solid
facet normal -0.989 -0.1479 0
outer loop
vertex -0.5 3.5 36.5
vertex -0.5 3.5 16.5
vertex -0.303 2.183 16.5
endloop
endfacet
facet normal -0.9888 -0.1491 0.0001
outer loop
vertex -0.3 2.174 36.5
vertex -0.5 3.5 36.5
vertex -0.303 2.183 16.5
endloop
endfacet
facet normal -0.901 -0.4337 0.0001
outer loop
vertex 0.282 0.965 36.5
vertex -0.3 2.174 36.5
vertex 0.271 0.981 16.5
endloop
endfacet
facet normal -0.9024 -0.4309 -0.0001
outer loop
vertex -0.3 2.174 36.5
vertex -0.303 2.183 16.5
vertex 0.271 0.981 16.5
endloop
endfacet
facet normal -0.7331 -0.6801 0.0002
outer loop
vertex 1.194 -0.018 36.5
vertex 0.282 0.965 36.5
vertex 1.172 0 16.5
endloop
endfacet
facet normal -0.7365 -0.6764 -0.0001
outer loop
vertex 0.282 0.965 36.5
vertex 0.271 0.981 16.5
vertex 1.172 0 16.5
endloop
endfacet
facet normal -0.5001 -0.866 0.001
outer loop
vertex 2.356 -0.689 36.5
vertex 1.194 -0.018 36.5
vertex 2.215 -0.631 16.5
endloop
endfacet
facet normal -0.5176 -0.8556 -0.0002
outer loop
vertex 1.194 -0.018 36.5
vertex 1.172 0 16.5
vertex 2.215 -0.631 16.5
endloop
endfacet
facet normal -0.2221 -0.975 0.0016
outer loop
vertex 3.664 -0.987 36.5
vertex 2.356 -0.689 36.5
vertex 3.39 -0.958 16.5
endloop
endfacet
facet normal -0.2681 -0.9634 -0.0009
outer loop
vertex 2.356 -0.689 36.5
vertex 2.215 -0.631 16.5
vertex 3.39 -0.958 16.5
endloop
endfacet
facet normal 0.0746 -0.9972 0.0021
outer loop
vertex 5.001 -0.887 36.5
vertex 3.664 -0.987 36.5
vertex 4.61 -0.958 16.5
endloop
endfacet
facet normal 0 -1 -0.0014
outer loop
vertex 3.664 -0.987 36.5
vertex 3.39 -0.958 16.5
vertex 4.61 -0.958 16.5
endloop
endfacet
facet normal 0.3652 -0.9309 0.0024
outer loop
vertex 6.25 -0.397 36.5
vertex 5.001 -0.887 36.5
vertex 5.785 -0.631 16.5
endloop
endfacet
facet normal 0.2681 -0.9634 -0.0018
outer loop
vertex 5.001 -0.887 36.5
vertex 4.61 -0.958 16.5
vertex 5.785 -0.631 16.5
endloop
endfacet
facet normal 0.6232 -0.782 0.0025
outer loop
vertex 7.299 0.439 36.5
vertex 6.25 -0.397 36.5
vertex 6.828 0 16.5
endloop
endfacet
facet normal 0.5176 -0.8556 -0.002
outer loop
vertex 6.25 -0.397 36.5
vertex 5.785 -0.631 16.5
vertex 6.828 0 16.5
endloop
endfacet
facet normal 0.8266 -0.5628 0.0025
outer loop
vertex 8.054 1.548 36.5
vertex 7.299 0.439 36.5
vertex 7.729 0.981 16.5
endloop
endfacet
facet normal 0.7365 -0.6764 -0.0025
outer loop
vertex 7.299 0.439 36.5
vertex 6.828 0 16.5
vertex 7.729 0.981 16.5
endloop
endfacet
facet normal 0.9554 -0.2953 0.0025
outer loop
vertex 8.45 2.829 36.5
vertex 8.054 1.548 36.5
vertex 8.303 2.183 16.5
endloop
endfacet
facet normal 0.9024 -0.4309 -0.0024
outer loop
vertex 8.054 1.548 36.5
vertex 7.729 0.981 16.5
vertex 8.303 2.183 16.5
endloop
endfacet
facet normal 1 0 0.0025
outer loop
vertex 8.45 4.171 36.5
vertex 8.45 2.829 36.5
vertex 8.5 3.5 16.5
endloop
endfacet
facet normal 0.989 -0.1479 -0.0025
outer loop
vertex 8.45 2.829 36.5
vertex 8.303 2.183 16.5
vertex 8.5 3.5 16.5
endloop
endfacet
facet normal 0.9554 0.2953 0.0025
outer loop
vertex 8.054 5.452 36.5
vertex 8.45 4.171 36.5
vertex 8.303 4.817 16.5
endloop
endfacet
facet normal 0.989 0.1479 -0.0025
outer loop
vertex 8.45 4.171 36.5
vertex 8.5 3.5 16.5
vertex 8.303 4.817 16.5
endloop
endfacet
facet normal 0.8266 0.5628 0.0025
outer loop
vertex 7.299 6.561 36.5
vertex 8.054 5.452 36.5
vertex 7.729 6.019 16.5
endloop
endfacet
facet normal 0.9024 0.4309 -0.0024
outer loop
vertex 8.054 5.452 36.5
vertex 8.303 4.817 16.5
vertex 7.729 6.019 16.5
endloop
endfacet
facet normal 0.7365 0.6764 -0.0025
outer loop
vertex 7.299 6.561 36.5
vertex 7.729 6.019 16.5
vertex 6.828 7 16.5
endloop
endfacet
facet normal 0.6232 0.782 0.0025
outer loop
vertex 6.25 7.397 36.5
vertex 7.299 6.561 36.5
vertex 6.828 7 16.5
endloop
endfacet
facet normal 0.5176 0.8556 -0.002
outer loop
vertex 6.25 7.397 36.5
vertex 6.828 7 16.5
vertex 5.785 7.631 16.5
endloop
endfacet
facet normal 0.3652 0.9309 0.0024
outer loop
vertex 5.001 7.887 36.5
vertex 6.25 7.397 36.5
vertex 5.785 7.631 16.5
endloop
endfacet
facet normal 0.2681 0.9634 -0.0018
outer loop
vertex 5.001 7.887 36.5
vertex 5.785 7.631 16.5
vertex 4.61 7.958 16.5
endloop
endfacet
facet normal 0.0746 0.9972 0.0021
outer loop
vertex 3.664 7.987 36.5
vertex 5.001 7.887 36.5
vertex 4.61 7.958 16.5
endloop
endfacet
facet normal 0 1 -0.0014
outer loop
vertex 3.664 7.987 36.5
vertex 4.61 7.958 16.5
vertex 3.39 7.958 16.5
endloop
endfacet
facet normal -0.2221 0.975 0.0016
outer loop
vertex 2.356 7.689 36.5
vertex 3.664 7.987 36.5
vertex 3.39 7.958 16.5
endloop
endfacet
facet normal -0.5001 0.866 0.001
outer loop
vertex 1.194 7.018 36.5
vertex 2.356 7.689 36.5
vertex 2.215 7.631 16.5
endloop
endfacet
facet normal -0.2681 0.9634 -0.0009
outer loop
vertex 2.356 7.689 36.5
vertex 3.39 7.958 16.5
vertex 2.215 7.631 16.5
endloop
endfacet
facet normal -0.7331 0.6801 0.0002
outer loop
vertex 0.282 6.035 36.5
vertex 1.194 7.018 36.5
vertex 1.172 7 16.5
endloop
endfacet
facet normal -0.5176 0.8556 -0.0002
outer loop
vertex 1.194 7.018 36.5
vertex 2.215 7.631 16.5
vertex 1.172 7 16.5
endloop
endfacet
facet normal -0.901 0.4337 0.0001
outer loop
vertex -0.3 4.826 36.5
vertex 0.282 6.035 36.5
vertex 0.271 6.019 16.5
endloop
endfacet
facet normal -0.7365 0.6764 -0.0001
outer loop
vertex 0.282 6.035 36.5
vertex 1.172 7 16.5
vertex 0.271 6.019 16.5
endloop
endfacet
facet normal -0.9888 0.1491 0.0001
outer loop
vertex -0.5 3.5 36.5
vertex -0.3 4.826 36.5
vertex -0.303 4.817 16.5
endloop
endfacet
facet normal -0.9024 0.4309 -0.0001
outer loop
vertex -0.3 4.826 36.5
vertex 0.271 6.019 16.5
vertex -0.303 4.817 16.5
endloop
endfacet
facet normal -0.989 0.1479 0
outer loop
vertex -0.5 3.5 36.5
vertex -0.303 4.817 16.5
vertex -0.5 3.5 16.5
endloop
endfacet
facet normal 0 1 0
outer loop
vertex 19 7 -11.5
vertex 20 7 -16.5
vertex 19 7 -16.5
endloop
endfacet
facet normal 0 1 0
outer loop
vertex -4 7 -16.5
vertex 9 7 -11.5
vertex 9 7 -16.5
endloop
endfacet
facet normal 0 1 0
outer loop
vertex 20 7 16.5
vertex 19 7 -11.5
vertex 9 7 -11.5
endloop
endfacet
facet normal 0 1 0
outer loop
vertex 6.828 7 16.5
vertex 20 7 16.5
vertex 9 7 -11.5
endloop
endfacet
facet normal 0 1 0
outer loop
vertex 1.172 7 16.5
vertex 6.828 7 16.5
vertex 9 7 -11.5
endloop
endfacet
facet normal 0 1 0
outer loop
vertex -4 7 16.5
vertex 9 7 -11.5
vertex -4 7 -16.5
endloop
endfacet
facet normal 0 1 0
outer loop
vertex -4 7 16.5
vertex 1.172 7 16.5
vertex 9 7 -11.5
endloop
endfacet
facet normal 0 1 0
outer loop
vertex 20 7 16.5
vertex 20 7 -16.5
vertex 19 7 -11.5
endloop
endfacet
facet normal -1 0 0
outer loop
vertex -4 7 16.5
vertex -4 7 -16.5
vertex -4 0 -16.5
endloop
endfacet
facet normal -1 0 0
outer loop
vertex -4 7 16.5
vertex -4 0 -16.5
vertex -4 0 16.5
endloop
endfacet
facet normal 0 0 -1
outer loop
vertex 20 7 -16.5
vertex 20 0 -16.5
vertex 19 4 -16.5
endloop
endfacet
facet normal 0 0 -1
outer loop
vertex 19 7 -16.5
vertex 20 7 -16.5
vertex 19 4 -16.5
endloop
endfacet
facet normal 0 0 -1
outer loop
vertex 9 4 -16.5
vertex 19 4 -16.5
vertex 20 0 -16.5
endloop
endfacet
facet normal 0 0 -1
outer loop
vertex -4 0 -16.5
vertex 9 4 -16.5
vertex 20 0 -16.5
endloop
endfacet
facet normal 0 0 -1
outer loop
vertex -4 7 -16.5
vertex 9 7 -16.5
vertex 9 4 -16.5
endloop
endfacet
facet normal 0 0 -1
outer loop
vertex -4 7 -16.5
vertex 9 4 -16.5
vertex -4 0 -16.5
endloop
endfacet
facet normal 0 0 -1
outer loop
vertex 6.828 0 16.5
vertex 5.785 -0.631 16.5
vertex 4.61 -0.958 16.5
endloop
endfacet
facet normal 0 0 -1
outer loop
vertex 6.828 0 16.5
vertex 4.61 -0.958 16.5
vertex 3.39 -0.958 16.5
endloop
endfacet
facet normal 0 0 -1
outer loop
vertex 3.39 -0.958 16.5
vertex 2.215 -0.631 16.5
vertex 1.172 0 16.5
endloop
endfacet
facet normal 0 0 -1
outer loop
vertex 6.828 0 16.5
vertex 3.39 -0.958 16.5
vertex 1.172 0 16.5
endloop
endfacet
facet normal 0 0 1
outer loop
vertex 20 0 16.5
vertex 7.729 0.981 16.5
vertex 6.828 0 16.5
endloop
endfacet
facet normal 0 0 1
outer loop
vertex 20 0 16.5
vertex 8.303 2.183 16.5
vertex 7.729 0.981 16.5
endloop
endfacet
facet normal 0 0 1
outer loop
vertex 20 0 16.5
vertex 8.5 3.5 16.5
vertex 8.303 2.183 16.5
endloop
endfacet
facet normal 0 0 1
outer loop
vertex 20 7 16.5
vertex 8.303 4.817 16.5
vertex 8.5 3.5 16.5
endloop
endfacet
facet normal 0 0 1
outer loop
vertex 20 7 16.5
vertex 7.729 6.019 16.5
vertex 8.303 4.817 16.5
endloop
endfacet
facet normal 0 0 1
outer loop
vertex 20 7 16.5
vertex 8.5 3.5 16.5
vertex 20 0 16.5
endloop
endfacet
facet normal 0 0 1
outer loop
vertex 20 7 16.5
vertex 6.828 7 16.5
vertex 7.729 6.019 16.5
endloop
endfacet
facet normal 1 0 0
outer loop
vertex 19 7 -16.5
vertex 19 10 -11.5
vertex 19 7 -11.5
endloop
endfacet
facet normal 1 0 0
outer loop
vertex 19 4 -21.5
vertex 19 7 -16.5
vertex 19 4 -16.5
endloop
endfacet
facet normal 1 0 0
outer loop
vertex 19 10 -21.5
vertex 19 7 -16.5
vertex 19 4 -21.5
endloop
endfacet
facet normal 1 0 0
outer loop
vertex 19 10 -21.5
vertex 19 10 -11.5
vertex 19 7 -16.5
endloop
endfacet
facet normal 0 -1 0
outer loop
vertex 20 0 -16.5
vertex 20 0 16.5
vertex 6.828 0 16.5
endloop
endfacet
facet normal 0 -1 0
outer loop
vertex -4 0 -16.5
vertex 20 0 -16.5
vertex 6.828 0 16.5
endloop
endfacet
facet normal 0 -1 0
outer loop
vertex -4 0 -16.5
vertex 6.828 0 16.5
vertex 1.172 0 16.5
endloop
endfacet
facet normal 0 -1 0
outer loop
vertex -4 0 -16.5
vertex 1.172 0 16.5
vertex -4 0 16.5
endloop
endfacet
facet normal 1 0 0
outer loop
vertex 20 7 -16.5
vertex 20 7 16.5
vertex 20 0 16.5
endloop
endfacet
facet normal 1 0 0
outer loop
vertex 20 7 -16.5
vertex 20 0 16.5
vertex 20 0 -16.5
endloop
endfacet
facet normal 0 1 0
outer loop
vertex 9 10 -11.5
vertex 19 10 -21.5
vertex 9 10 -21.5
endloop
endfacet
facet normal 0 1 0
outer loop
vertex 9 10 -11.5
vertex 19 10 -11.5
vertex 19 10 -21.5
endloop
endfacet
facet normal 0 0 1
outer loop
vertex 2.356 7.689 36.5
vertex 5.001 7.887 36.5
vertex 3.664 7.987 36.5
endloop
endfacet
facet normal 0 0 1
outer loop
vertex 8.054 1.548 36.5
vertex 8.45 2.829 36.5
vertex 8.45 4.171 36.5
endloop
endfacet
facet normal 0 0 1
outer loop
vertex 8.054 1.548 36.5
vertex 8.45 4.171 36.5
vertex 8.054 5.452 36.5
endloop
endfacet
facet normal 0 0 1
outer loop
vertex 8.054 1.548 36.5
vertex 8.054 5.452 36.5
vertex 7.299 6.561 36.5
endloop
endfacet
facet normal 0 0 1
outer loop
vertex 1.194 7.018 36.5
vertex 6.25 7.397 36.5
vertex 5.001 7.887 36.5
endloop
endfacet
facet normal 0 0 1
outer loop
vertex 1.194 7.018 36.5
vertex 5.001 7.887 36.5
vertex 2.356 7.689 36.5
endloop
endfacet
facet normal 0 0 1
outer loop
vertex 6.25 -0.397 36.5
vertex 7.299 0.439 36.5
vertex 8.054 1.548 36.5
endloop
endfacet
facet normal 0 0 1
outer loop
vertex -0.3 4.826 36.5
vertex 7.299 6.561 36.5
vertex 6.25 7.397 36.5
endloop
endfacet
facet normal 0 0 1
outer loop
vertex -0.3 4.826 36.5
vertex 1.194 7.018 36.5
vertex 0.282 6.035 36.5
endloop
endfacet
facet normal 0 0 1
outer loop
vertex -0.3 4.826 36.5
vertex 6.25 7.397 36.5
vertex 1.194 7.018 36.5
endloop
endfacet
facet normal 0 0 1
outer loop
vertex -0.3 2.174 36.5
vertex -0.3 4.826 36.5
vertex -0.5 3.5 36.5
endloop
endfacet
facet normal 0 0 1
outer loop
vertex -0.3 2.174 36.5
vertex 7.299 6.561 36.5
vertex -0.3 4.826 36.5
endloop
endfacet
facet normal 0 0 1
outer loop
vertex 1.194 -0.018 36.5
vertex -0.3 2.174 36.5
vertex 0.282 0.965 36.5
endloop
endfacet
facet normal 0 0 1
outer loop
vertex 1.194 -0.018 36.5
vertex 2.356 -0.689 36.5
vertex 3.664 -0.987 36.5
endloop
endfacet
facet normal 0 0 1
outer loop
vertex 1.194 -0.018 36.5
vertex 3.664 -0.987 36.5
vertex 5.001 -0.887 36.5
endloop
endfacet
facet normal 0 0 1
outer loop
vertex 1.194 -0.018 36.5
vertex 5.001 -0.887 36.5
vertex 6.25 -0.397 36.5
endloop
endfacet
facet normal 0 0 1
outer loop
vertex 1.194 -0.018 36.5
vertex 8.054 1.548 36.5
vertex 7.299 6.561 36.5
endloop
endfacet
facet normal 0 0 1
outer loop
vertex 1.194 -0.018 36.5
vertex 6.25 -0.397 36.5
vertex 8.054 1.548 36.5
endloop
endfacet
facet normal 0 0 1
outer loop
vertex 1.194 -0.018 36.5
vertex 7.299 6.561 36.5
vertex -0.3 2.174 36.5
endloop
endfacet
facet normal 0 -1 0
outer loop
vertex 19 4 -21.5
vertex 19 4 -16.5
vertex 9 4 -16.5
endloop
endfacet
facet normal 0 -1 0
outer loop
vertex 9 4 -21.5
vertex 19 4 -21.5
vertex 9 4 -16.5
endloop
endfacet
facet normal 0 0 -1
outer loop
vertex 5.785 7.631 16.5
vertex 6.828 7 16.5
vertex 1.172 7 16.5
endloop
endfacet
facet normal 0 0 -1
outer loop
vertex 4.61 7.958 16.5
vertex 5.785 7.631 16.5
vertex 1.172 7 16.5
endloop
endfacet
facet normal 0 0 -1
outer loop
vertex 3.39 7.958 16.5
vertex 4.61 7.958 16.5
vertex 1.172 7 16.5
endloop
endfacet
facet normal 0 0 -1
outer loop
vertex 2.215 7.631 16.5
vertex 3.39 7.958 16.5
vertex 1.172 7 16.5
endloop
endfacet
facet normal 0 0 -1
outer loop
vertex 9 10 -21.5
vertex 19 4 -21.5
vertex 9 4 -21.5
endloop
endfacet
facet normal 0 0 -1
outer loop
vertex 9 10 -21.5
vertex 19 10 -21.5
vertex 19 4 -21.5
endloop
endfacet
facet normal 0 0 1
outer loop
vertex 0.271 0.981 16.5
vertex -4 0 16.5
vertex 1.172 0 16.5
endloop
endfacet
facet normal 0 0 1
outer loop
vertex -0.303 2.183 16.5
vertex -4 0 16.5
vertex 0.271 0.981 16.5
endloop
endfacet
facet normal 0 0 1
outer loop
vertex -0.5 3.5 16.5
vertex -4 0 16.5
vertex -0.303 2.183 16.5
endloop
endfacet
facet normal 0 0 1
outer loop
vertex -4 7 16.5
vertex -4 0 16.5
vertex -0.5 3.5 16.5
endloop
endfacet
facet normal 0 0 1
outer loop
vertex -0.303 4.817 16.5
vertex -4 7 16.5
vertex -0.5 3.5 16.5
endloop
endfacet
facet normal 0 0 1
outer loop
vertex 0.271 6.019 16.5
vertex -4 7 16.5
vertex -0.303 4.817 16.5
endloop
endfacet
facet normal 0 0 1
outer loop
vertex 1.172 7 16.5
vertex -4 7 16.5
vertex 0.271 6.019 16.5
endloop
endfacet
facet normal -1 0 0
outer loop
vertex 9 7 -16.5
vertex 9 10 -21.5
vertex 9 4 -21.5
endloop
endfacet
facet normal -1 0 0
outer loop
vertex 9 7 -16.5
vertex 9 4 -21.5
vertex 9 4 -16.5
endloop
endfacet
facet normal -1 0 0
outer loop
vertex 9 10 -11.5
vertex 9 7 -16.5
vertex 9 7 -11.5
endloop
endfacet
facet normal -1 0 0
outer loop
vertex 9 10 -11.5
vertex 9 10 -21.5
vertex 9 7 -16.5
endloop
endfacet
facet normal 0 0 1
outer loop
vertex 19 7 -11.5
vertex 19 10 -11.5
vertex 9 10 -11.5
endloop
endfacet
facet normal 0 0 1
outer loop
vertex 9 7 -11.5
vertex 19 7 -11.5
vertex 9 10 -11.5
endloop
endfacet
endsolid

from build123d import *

# Parameters (mm, degrees)
F0_W     = 10
F0_H     = 5
F1_DEPTH = 7
F2_DEPTH = 3
F3_R     = 4.5
F4_DEPTH = 20
F5_ANGLE = 180


with BuildPart() as f1:
    # F0 (on Front) → F1 (new body)
    with BuildSketch(Plane.XZ):
        Polygon((12, -16.5), (12, 16.5), (-12, 16.5), (-12, -16.5), (-11, -16.5), (-11, -11.5), (-1, -11.5), (-1, -16.5), align=None)
        with Locations((-6, -14)):
            Rectangle(F0_W, F0_H)
    extrude(amount=-F1_DEPTH)

    # F0 (on Front) → F2 (join, symmetric)
    with BuildSketch(Plane.XZ):
        with Locations((-6, -19)):
            Rectangle(F0_W, F0_H)
        with Locations((-6, -14)):
            Rectangle(F0_W, F0_H)
    extrude(amount=F2_DEPTH, both=True)

    # F3 (on face) → F4 (join)
    with BuildSketch(Plane.XY.offset(16.5)):
        with Locations((4, 3.5)):
            Circle(F3_R)
    extrude(amount=F4_DEPTH)


with BuildPart() as f1_1:
    # F5: moved
    add(f1.part.rotate(Axis((4, 3.5, 16.5), (0, 0, -1)), F5_ANGLE))


solid = f1_1.part
